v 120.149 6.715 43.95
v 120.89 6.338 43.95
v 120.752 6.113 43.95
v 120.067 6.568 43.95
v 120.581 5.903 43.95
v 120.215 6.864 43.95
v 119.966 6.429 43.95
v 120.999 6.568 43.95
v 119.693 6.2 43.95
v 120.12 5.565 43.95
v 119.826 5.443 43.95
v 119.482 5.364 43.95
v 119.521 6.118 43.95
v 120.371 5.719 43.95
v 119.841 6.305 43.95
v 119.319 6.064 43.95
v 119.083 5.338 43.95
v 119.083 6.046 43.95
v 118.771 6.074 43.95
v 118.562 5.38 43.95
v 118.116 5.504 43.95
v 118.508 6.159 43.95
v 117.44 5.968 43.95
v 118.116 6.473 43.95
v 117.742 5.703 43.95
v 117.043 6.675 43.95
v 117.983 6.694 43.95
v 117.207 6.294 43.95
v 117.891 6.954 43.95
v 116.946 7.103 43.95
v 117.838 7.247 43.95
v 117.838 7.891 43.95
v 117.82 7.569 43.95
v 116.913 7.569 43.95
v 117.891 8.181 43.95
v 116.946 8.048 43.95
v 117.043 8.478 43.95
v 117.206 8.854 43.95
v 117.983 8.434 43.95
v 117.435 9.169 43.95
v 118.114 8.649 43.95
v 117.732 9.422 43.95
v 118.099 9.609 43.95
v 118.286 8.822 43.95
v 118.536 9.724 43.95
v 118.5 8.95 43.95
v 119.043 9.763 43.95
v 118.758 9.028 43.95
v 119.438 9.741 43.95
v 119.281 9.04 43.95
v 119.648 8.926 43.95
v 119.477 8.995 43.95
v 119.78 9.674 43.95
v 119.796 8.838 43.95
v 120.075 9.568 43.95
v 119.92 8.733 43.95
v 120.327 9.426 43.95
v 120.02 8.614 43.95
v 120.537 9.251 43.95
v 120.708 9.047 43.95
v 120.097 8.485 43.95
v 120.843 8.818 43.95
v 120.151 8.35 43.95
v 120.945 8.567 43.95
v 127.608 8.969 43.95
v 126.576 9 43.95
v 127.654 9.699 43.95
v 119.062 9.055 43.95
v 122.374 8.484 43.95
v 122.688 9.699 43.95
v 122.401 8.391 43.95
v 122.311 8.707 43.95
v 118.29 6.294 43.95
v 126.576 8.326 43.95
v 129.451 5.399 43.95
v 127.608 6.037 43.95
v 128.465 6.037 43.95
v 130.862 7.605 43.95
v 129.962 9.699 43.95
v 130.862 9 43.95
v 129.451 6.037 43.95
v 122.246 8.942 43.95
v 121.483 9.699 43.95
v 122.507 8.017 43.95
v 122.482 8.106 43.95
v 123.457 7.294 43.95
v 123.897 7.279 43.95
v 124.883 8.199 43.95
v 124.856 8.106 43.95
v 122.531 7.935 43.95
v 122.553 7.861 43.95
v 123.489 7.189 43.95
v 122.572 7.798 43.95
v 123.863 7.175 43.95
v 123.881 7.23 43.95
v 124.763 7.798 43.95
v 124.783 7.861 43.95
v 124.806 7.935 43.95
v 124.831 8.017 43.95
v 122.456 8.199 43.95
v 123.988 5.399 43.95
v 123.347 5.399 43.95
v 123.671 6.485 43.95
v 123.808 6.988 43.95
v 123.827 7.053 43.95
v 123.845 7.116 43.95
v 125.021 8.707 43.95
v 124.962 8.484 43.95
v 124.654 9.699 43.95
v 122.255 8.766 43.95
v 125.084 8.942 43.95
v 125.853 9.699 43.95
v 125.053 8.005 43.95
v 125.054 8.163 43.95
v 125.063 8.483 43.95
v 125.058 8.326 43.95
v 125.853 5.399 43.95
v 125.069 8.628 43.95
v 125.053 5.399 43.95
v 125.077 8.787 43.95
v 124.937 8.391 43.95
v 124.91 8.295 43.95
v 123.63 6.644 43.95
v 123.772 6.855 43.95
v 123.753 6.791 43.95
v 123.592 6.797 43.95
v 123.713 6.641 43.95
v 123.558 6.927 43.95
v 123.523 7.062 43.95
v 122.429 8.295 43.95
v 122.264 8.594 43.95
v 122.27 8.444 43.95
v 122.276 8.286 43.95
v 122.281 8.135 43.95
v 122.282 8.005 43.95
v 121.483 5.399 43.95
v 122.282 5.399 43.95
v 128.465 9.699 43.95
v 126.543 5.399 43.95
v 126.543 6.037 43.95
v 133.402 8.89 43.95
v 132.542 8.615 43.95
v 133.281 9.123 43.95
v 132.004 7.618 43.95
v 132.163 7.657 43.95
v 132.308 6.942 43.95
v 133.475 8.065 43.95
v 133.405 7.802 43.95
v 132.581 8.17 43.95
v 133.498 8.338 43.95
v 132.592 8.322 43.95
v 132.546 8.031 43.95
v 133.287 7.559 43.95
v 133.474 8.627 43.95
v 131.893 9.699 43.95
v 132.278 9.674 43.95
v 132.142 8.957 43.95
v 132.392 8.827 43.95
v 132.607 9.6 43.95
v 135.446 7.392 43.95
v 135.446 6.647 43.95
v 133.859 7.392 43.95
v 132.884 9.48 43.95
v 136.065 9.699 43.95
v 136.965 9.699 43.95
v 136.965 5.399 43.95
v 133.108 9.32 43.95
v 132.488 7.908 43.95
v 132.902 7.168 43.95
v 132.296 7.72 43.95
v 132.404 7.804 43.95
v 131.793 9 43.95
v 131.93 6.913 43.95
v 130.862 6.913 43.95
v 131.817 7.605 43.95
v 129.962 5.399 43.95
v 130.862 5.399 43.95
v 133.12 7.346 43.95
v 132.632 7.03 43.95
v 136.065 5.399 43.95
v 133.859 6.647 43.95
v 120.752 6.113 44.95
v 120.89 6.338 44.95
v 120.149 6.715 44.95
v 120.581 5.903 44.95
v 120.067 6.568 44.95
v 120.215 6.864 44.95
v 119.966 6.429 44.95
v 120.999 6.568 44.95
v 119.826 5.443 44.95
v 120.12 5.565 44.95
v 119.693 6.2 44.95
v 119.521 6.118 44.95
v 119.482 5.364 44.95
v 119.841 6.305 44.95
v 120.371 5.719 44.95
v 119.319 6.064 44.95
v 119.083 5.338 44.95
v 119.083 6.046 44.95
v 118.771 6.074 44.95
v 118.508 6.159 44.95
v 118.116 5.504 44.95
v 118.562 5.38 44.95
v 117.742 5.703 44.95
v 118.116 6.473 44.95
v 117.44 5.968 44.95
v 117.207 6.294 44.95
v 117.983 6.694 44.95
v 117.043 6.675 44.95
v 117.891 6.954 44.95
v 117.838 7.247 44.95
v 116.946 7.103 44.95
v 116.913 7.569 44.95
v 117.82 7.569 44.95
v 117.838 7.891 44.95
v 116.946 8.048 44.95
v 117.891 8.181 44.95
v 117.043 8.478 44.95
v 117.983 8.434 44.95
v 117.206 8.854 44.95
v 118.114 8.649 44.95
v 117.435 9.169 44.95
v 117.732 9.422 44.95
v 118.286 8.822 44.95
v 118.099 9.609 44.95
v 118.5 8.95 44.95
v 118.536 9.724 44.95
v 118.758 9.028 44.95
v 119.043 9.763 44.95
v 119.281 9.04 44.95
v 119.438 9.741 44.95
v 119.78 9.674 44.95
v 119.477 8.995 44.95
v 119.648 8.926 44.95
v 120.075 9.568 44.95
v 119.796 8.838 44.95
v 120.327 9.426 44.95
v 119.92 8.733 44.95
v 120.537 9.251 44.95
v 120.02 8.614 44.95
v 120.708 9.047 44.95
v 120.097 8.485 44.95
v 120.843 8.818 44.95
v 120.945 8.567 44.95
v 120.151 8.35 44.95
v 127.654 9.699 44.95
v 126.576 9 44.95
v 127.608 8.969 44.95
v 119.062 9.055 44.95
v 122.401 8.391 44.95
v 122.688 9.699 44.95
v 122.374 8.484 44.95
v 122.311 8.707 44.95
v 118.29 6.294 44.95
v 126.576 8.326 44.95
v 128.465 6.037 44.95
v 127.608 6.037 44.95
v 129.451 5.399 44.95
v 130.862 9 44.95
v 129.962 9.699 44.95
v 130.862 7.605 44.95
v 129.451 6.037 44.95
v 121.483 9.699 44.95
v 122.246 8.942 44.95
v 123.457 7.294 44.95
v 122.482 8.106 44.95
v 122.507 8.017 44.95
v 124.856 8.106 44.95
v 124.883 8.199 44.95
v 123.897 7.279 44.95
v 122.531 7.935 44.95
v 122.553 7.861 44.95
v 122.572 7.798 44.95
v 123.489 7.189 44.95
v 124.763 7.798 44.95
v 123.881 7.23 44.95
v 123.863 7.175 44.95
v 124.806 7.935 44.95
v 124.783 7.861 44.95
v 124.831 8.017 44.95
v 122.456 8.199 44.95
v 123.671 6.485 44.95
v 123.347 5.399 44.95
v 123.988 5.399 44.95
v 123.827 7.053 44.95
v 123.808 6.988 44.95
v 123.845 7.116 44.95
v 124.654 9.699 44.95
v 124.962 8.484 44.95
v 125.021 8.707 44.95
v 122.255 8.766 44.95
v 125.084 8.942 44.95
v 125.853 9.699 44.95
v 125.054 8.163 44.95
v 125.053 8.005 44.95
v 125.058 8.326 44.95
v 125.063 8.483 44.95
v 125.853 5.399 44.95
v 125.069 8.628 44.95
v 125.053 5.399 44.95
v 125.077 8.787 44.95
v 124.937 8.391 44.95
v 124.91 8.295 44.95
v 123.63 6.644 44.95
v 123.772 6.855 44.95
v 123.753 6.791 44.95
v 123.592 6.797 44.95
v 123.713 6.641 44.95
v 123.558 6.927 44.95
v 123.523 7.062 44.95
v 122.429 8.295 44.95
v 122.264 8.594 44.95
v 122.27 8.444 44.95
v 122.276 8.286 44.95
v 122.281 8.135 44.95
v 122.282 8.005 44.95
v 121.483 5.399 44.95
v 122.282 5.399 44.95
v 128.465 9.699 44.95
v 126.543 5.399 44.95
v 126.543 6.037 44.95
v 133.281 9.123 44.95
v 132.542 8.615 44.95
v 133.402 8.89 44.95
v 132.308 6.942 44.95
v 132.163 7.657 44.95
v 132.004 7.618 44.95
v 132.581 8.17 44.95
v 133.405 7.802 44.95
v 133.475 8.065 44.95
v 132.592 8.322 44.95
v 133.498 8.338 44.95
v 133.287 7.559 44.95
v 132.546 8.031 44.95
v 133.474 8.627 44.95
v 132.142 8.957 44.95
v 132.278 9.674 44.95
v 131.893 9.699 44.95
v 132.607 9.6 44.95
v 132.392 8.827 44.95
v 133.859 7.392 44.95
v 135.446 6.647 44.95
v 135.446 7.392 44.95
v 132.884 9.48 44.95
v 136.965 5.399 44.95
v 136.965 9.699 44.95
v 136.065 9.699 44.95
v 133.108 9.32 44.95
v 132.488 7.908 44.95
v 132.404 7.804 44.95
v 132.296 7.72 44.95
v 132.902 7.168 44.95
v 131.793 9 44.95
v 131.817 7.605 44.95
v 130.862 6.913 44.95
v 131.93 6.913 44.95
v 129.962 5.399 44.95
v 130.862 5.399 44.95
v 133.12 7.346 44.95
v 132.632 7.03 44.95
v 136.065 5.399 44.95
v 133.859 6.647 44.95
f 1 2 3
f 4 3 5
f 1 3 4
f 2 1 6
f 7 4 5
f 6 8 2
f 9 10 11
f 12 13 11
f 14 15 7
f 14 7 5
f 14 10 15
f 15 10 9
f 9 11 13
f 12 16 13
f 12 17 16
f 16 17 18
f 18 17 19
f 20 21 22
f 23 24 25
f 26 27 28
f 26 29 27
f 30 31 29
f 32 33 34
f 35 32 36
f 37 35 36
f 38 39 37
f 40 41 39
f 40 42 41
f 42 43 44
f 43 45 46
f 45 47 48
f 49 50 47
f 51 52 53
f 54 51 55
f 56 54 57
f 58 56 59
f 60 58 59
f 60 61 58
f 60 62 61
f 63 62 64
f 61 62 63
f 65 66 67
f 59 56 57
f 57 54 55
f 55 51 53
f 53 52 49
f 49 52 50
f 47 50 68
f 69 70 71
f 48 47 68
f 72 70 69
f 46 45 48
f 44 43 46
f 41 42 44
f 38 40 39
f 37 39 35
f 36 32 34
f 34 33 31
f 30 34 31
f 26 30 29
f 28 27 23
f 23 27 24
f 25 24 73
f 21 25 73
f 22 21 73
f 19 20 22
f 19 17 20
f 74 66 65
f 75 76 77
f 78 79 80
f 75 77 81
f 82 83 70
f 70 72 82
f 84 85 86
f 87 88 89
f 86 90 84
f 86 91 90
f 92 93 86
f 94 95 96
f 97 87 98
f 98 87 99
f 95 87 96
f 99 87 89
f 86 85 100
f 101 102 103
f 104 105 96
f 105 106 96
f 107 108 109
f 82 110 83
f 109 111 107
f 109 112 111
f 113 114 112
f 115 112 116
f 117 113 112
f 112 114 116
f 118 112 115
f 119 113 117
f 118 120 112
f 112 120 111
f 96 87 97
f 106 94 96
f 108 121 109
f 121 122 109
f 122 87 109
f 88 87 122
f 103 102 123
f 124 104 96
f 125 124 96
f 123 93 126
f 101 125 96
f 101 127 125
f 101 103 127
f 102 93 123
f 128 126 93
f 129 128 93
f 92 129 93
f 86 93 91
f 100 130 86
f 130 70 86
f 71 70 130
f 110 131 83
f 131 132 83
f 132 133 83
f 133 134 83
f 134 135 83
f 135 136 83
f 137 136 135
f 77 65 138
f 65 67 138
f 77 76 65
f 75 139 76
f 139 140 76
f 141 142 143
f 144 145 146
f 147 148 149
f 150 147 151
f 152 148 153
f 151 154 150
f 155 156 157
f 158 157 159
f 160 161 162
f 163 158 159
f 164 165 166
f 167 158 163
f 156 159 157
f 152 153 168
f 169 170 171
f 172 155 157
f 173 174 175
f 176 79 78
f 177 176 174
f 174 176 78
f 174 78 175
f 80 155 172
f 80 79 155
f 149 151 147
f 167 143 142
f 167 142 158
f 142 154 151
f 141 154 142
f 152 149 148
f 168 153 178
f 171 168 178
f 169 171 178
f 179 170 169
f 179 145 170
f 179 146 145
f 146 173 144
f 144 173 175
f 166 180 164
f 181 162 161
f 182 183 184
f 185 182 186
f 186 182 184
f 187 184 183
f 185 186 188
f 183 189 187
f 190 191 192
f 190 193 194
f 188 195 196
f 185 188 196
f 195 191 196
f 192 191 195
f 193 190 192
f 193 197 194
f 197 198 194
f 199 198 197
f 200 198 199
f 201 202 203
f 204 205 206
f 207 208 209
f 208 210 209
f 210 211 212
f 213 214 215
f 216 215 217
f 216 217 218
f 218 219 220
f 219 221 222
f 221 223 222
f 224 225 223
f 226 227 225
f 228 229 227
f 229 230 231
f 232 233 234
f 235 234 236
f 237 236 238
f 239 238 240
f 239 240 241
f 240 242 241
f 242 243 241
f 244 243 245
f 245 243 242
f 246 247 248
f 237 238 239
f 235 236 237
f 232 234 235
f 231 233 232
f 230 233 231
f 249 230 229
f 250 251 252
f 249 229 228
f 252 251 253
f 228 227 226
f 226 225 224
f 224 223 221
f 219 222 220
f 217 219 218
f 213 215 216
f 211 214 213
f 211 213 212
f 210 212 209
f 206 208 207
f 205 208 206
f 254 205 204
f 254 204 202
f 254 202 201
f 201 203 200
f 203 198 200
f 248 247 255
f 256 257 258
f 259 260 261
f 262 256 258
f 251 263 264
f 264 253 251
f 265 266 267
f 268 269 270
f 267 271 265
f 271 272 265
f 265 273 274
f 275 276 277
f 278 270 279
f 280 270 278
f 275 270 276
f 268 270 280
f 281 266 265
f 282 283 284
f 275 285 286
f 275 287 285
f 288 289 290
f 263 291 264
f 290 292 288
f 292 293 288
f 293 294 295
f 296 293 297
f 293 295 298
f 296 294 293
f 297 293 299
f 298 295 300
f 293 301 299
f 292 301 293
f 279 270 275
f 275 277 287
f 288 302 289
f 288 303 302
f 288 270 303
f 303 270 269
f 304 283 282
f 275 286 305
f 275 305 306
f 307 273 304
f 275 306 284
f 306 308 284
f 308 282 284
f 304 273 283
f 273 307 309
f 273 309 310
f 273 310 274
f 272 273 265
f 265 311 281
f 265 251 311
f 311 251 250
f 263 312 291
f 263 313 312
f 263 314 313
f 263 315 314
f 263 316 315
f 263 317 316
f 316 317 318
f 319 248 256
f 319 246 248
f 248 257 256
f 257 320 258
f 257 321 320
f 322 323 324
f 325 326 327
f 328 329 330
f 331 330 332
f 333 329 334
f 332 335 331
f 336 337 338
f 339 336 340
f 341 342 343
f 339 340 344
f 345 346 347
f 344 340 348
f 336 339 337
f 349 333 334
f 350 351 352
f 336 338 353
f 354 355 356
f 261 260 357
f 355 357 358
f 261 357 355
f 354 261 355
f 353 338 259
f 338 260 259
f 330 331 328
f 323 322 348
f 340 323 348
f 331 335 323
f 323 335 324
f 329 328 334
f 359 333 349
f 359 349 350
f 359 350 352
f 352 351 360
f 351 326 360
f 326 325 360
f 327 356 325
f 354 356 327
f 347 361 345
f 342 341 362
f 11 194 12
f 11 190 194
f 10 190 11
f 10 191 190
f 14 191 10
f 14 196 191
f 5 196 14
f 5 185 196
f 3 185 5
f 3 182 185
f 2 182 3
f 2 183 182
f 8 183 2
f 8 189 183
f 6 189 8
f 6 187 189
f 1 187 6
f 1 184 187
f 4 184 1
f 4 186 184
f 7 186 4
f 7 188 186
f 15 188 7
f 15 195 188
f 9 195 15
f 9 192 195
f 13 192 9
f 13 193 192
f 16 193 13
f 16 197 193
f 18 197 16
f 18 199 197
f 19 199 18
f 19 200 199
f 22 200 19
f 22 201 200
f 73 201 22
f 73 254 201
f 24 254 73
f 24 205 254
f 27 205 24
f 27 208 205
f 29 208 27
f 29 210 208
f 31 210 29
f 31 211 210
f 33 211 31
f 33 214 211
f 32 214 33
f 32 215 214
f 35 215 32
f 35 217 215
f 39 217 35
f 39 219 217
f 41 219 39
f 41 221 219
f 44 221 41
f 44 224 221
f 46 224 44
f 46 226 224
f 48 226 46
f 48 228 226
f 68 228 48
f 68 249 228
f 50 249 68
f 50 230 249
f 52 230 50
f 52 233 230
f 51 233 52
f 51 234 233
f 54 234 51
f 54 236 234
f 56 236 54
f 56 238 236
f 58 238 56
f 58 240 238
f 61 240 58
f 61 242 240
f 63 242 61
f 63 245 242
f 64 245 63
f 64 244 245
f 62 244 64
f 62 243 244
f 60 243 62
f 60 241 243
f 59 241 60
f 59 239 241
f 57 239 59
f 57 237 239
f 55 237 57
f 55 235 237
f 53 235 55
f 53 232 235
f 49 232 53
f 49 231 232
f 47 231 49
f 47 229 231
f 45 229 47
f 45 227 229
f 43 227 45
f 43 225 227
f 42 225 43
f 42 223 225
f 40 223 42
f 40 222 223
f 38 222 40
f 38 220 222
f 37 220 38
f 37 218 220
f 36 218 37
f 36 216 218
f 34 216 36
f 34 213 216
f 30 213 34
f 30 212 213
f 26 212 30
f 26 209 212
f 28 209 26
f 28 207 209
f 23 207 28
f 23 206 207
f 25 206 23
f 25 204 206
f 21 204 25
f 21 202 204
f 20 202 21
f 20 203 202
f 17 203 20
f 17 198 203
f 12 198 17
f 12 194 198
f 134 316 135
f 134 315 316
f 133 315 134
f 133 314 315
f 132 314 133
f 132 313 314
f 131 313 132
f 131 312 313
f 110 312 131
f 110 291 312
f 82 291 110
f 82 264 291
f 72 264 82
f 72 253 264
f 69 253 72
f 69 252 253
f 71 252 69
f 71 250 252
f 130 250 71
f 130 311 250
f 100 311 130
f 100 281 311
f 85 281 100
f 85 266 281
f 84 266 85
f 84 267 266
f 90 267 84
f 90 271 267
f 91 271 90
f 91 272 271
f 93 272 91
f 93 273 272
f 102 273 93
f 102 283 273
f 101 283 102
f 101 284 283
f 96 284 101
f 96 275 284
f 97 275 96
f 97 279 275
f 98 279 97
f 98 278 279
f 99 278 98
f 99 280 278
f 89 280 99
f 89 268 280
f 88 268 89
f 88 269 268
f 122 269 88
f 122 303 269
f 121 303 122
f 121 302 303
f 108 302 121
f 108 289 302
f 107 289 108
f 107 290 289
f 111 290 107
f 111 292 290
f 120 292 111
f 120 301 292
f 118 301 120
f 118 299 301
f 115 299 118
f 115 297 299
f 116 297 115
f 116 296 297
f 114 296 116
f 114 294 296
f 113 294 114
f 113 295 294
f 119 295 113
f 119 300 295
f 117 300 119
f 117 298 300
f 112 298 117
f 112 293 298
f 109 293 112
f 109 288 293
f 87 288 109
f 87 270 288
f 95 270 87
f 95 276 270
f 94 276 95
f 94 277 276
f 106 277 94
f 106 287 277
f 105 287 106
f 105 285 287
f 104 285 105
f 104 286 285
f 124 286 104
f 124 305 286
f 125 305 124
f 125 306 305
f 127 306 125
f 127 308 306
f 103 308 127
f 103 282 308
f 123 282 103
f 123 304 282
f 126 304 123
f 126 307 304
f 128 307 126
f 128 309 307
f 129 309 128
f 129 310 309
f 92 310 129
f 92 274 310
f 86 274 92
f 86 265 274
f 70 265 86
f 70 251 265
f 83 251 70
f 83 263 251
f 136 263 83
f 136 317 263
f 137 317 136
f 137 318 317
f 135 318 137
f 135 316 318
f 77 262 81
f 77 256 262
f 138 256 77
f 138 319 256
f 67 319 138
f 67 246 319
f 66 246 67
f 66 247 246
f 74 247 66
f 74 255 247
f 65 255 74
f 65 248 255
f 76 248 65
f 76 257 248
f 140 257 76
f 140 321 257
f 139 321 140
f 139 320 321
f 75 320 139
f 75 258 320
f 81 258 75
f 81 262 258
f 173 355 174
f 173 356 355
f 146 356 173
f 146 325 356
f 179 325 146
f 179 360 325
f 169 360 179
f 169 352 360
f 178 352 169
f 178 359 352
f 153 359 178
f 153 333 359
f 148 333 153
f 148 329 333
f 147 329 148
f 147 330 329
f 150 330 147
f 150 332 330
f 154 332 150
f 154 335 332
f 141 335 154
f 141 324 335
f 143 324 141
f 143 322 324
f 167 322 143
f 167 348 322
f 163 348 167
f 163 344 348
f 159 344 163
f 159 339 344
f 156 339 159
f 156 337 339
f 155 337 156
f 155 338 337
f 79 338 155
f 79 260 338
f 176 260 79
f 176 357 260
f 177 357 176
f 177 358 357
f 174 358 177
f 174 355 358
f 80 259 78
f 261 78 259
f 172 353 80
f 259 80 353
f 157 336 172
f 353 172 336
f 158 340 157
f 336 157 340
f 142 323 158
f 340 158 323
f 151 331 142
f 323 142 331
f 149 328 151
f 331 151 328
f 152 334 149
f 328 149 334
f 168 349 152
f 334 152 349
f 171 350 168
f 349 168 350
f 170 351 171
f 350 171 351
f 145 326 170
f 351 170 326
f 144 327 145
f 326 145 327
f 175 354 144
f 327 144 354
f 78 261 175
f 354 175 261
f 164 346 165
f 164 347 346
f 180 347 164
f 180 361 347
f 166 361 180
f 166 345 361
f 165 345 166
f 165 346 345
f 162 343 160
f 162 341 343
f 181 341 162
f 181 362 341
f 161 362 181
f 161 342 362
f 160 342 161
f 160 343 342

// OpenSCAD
// CM1P-I ID text, engraved 0.5 into the plate's top face (frame as cm1p_i_freecad.py).
translate([127, 7.5, 43.95]) linear_extrude(1) text("CM1P-I", size = 4.5, font = "Liberation Sans:style=Bold", halign = "center", valign = "center");
